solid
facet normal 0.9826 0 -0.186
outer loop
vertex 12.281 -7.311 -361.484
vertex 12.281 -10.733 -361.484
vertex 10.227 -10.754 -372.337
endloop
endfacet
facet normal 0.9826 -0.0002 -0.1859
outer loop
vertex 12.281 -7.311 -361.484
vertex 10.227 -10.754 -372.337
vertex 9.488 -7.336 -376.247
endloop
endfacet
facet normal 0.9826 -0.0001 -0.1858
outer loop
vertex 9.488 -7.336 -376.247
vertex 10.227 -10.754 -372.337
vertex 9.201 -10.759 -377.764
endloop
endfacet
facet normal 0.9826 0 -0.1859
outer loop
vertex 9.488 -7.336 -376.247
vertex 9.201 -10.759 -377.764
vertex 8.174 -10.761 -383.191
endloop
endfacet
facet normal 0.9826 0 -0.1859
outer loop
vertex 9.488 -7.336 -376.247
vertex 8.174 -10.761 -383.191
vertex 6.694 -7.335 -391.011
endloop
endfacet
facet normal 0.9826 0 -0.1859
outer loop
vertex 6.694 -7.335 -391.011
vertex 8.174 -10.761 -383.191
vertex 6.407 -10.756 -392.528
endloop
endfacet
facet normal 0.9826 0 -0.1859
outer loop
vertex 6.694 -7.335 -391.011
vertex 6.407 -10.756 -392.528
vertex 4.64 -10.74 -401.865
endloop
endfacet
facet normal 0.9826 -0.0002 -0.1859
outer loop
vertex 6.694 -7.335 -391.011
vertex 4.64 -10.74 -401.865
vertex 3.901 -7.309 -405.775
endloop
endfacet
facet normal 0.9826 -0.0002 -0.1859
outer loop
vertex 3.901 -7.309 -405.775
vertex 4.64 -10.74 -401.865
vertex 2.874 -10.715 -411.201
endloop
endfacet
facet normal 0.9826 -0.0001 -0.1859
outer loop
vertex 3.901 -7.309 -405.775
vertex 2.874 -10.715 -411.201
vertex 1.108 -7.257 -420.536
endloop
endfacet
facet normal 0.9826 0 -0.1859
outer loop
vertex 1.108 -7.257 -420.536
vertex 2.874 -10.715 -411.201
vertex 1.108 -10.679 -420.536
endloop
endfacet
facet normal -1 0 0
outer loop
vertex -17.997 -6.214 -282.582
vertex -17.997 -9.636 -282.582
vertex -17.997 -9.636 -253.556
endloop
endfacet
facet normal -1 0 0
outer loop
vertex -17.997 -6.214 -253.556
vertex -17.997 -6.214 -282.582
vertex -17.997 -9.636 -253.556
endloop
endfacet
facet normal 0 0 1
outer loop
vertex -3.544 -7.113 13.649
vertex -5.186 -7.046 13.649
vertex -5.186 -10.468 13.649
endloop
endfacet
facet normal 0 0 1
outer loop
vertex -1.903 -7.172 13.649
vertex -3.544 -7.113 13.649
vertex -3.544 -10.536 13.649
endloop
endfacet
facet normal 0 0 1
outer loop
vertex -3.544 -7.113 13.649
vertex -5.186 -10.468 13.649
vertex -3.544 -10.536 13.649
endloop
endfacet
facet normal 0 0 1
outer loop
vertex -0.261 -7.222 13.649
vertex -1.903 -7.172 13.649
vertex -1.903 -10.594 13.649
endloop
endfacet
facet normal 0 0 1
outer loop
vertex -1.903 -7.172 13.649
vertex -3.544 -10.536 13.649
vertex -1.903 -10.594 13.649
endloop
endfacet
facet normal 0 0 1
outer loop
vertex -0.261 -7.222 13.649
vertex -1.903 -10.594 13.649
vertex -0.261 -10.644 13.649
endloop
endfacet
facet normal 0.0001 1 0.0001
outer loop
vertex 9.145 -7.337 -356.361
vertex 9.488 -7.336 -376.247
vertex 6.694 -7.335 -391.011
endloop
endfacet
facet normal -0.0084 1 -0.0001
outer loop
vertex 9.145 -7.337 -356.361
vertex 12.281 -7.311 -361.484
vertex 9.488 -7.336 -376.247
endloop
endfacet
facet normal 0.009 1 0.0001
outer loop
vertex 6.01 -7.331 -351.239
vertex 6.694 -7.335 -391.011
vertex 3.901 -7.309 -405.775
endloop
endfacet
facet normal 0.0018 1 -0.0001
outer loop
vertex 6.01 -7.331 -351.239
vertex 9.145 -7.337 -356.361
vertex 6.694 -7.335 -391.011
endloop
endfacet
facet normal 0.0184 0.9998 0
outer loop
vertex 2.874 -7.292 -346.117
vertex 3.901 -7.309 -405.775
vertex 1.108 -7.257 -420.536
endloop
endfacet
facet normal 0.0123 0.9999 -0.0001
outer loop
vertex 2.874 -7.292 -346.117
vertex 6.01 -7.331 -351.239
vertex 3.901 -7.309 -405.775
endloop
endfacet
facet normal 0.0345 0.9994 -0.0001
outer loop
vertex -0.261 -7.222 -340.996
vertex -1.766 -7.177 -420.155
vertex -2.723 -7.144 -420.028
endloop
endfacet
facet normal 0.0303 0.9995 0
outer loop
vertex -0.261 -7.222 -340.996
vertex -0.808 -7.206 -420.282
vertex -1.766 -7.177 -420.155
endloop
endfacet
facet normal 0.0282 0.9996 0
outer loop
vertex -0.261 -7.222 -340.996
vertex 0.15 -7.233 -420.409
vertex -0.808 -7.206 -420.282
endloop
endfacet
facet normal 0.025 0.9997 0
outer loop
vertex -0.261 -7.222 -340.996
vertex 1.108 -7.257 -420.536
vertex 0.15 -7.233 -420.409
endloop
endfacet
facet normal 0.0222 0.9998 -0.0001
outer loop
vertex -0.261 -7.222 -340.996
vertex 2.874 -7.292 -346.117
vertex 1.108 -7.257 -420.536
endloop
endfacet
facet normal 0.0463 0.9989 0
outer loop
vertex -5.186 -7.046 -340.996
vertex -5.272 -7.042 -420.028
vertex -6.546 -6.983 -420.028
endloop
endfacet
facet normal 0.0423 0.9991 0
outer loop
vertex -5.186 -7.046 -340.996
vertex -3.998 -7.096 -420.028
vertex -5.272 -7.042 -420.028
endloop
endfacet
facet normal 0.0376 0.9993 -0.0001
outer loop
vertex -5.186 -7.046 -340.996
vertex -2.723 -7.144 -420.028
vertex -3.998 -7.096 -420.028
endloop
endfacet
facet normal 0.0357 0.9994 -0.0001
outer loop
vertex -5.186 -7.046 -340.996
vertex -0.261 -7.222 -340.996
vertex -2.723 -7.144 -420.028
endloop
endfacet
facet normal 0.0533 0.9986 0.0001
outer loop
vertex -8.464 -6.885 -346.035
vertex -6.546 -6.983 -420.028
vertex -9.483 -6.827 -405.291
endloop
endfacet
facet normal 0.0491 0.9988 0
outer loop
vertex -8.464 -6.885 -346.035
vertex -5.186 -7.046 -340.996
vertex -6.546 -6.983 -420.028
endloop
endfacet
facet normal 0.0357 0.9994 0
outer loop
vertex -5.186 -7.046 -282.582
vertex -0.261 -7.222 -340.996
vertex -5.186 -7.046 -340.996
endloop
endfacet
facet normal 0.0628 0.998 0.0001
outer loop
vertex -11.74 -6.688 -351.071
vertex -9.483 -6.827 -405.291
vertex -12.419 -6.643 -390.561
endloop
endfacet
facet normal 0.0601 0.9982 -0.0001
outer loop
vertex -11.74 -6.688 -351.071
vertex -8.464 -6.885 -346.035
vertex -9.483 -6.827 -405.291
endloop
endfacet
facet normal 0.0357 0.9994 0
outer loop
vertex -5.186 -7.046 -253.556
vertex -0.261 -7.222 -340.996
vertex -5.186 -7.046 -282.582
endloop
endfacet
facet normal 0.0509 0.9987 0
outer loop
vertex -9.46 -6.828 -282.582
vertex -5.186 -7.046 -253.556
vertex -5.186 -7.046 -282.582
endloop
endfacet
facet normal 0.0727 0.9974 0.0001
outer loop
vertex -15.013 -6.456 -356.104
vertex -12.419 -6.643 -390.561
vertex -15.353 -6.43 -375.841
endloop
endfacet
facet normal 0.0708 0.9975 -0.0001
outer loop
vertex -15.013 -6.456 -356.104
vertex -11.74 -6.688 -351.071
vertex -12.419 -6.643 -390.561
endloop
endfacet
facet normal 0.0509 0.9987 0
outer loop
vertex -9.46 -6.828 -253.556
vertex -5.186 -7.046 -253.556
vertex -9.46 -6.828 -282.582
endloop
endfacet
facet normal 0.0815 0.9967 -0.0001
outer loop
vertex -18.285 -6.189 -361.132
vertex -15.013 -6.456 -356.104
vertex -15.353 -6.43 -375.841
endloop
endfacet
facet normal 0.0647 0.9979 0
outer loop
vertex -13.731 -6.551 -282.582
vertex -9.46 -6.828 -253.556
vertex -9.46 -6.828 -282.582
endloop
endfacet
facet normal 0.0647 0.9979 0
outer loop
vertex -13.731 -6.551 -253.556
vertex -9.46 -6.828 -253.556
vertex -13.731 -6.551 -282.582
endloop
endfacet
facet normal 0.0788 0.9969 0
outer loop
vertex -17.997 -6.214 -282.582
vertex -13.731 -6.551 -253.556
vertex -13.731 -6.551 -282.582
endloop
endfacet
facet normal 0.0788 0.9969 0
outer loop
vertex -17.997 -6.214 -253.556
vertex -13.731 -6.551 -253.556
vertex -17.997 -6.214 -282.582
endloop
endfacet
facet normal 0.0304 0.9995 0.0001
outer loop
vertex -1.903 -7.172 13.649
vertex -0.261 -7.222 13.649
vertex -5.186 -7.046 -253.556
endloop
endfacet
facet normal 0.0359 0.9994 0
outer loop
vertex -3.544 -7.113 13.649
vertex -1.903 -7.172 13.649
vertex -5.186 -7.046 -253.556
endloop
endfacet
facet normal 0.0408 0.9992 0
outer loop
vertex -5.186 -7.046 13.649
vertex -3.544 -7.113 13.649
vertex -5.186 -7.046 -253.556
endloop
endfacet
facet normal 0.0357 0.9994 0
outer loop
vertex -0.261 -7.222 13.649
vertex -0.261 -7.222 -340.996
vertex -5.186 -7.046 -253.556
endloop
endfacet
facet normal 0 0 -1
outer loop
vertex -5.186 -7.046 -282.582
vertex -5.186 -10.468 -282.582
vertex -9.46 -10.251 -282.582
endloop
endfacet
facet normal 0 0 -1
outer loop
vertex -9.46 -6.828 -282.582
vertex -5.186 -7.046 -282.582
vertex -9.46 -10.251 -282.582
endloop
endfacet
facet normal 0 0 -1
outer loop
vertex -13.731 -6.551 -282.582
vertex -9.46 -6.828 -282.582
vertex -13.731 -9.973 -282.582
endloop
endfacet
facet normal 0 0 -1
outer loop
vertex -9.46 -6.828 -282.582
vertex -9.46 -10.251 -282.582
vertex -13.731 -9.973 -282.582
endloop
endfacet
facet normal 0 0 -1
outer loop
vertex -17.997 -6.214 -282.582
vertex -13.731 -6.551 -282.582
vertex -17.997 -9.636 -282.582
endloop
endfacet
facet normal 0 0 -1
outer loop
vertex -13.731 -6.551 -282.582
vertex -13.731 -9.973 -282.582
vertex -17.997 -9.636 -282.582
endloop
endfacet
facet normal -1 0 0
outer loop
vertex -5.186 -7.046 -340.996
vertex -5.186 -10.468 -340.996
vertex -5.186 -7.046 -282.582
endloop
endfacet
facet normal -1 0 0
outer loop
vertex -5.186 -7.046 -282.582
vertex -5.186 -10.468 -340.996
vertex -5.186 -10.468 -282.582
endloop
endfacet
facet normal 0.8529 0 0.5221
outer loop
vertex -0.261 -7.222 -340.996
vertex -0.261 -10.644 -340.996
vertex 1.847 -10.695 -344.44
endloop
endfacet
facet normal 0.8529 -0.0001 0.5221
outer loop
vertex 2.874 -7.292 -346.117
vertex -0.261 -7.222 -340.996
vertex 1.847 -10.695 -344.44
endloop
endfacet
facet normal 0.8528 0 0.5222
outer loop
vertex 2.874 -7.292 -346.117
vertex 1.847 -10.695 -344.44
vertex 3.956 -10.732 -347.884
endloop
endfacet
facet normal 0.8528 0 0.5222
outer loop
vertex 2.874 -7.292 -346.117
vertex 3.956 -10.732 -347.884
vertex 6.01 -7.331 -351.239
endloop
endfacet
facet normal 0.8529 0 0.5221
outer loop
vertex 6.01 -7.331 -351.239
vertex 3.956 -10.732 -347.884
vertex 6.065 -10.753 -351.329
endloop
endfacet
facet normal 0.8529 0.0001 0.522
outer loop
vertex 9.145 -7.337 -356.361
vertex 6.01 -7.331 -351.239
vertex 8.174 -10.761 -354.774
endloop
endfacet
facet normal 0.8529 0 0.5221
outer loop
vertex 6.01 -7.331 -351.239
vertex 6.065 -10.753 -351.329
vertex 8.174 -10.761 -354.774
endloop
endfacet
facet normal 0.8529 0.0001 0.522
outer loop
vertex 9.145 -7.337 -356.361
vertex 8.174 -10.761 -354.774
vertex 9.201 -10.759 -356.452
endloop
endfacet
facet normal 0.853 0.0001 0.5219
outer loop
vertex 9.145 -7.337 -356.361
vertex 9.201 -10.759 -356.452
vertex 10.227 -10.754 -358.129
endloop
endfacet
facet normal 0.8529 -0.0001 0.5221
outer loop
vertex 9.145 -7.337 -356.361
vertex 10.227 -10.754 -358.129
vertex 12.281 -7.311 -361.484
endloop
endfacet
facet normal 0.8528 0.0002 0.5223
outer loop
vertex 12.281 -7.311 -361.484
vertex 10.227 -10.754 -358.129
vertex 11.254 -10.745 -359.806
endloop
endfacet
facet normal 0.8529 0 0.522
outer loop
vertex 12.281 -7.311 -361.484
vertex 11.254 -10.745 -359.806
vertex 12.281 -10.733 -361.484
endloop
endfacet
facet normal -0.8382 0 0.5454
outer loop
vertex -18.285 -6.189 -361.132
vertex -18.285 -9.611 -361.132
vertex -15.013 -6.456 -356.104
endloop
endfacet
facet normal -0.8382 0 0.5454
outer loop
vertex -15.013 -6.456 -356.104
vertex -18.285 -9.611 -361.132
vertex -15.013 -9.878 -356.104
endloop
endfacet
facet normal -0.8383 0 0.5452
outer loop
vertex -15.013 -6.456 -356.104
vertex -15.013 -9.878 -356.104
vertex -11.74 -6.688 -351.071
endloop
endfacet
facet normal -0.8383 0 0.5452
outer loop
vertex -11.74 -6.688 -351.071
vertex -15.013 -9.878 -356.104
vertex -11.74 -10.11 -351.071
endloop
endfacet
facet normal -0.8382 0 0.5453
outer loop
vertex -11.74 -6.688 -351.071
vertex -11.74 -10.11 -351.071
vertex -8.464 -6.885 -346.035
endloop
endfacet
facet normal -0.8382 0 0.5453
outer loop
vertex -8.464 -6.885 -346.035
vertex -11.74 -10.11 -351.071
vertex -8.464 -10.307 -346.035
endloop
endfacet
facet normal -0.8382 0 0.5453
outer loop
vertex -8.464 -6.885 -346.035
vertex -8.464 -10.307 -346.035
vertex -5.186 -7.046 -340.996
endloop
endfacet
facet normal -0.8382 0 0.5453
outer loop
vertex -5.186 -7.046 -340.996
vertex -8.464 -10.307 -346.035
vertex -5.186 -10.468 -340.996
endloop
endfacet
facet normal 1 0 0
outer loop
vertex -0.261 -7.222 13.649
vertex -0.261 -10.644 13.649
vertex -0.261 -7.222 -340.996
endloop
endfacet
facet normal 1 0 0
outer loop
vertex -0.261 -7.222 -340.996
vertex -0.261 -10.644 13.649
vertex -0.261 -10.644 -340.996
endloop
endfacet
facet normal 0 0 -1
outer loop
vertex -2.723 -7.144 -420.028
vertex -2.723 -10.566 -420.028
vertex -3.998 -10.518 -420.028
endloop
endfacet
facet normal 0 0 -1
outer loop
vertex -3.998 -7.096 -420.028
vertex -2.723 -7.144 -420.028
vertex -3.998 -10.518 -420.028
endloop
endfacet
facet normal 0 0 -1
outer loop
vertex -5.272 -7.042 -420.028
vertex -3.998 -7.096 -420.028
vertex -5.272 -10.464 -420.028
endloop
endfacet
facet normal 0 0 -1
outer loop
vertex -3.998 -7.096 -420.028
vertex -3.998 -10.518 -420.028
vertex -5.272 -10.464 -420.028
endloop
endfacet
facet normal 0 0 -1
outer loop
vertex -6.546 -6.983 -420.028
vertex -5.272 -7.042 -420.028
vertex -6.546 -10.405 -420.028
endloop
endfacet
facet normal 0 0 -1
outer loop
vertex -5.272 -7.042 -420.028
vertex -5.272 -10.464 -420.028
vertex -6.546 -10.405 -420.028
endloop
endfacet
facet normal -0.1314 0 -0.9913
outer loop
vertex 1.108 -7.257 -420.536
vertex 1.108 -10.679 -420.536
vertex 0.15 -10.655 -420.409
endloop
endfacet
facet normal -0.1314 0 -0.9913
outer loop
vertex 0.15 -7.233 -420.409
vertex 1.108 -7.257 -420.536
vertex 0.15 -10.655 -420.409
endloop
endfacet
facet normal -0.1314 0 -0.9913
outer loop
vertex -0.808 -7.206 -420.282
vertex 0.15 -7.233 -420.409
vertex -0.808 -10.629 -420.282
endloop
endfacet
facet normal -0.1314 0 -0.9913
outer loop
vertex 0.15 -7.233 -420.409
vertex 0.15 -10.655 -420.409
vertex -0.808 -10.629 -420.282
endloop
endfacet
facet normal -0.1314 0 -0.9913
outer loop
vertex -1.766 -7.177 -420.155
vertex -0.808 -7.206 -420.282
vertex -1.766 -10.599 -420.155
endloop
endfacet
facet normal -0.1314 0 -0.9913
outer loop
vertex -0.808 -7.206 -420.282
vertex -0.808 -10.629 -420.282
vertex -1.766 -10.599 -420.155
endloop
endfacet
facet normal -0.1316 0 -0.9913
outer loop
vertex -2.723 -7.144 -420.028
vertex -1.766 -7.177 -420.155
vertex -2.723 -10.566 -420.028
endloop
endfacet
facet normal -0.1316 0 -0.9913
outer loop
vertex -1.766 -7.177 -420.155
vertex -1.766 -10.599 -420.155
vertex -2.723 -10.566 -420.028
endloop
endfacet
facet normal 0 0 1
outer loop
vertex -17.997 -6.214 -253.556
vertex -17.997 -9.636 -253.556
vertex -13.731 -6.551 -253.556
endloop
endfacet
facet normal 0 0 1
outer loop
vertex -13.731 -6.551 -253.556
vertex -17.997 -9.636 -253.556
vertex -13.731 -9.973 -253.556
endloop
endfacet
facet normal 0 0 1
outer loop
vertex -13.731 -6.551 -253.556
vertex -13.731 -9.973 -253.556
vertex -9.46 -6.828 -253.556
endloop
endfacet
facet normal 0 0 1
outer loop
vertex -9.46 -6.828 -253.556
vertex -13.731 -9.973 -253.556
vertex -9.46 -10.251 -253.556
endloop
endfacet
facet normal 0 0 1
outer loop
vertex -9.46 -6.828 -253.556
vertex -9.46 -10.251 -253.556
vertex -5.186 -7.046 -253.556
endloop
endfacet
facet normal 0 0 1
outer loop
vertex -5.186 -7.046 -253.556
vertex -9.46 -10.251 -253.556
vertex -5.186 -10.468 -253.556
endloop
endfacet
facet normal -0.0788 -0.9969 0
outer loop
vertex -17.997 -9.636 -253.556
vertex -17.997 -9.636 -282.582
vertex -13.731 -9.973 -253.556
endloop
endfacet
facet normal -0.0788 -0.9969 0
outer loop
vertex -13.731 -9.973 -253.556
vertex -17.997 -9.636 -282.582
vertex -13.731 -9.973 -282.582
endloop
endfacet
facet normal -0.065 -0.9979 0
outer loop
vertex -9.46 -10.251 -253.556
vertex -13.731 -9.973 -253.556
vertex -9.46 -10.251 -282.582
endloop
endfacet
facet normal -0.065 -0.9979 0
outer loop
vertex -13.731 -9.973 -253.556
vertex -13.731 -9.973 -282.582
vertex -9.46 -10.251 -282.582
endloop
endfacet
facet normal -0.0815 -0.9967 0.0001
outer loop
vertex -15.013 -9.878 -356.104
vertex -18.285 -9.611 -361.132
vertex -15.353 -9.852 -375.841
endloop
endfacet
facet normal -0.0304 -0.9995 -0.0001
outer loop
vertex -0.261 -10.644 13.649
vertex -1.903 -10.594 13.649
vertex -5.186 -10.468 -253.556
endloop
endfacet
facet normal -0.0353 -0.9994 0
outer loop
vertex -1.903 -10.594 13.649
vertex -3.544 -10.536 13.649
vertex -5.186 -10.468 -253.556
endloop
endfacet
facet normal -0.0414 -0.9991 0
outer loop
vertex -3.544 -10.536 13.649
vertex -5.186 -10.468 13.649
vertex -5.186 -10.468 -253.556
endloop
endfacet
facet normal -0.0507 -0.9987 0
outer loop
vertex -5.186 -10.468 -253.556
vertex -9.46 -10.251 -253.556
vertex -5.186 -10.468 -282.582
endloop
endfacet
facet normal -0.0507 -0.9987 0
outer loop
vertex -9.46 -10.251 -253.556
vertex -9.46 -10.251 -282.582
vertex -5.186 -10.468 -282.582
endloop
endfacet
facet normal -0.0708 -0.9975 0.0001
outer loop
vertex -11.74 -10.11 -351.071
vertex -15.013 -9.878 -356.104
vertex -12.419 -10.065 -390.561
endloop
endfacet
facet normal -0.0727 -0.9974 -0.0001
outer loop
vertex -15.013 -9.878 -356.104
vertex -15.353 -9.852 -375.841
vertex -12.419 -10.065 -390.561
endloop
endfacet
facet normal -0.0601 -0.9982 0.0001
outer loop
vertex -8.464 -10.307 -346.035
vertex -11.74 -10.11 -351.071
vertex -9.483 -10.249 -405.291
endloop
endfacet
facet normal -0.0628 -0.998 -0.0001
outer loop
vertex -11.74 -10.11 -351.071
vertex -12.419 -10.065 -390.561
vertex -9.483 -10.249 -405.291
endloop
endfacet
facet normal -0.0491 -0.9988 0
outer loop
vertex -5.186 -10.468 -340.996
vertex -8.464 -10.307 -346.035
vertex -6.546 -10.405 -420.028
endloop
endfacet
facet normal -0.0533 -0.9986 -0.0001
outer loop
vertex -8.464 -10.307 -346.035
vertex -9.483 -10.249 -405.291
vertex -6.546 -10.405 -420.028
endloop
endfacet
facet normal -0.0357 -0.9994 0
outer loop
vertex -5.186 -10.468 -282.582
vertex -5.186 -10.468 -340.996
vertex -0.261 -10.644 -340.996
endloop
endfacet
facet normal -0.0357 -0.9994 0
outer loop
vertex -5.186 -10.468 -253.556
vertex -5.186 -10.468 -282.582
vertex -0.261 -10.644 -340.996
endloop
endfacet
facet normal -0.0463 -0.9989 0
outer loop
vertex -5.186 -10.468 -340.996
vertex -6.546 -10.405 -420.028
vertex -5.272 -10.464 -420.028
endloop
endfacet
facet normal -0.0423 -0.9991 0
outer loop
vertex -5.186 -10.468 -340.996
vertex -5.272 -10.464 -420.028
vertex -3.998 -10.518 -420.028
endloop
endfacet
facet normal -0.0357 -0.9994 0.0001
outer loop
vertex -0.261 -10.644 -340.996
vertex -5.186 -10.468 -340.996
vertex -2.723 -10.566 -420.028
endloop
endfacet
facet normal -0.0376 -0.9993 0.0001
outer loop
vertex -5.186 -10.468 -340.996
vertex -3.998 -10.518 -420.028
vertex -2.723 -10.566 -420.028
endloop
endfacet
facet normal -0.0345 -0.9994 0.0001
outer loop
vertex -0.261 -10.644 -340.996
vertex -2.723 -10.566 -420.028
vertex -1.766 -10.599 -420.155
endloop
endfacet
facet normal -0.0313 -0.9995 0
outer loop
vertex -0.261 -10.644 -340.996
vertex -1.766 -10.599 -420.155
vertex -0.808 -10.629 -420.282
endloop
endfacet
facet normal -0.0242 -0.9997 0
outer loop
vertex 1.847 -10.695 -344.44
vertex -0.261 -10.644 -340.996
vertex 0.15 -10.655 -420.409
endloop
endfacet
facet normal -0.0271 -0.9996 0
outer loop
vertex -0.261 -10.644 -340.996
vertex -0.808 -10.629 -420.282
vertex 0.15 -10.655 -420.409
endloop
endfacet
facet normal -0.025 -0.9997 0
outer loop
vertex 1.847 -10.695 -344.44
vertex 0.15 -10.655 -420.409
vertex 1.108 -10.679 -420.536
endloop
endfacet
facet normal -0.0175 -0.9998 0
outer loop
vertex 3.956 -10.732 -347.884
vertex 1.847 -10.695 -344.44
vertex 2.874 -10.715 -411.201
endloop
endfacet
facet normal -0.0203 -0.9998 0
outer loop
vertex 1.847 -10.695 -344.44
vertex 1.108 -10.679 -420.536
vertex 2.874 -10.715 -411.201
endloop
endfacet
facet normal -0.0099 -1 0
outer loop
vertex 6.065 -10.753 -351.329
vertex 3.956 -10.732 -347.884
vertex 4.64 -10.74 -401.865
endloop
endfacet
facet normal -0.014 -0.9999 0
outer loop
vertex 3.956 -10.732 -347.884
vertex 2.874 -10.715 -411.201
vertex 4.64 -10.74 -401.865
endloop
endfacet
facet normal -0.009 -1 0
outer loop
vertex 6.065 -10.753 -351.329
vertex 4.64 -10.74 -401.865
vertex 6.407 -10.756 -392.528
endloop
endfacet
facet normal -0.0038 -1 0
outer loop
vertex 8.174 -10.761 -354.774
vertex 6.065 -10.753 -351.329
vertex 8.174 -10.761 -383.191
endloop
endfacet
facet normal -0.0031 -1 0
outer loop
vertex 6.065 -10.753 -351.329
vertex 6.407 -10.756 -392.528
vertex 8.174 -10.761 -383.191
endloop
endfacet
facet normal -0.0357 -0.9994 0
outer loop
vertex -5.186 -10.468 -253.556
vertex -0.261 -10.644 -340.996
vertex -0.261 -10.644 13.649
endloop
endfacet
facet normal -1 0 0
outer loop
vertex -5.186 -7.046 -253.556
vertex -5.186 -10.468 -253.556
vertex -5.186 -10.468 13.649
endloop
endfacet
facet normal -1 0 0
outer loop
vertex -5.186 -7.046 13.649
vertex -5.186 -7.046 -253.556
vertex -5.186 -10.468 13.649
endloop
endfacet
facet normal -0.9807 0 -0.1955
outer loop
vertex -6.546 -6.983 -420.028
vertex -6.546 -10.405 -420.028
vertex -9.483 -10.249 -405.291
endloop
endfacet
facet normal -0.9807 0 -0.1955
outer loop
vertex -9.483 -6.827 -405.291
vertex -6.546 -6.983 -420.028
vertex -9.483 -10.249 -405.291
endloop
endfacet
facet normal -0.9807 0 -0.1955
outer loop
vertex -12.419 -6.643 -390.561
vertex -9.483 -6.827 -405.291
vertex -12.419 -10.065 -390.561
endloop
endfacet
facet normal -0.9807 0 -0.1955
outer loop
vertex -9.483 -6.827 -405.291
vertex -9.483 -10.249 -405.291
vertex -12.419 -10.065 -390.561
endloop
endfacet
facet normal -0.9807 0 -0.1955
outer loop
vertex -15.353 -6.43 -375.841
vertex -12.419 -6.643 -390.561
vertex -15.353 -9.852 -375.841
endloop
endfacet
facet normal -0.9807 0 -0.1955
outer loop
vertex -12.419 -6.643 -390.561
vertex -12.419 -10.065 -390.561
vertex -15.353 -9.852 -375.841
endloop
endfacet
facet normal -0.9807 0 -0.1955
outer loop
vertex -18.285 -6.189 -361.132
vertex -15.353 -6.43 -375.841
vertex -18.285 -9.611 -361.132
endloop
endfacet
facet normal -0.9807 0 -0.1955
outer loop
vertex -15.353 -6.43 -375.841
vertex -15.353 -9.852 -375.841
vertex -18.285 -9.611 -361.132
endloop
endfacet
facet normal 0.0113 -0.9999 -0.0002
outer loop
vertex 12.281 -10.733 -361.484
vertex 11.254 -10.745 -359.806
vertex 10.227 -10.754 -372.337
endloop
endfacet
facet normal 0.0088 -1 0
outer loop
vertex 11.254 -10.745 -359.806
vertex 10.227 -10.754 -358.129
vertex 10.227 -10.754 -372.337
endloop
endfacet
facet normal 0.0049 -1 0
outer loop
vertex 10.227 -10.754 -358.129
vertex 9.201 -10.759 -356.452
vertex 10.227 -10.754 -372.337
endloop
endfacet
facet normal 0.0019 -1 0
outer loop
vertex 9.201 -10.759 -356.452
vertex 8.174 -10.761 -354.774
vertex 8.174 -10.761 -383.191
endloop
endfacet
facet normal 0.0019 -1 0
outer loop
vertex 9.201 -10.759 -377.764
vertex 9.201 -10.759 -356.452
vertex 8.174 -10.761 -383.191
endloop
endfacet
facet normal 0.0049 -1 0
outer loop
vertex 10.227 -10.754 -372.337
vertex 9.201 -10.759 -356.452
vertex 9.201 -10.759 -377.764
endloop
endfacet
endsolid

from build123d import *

# Parameters (mm, degrees)
F2_DEPTH = 467.36
F0_W     = 1740.8808469772
F0_H     = 2259.9012851715
F3_DEPTH = 60.96
F4_SCALE = 4.0036646816


with BuildPart() as f2:
    # F1 (on Top) → F2 (new body, symmetric)
    with BuildSketch(Plane.XY):
        with BuildLine():
            ThreePointArc((43.9515819812, 10.727503337), (23.9174424667, 1.374675553), (2.0415819812, -1.8329499959))
            Line((2.0415819812, -1.8329499959), (2.0415819812, -2.6877246239))
            ThreePointArc((2.0415819812, -2.6877246239), (24.6495492784, 0.7433272272), (45.2215819812, 10.727503337))
            Line((45.2215819812, 10.727503337), (43.9515819812, 10.727503337))
        make_face()
        with BuildLine():
            Line((2.0415819812, -2.6877246239), (2.0415819812, -1.8329499959))
            ThreePointArc((2.0415819812, -1.8329499959), (-19.8342785043, 1.374675553), (-39.8684180188, 10.727503337))
            Line((-39.8684180188, 10.727503337), (-41.1384180188, 10.727503337))
            ThreePointArc((-41.1384180188, 10.727503337), (-20.566385316, 0.7433272272), (2.0415819812, -2.6877246239))
        make_face()
    extrude(amount=F2_DEPTH, both=True)

    # F0 (on Front) → F3 (cut, symmetric)
    with BuildSketch(Plane.XZ):
        with Locations((133.3307623863, -204.713344574)):
            Rectangle(F0_W, F0_H)
        with BuildLine():
            Line((-1.295193345, -63.3309016509), (-1.295193345, 3.4090982191))
            Line((-1.295193345, 3.4090982191), (-0.065193265, 3.4090982191))
            Line((-0.065193265, 3.4090982191), (-0.065193265, -85.1709024209))
            Line((-0.065193265, -85.1709024209), (3.0674625036, -90.2881598735))
            Line((3.0674625036, -90.2881598735), (0.2766351171, -105.037851818))
            add(Edge.make_bspline(
                [(-0.680193305, -107.4909024849), (-0.3650057018, -107.493656038), (-0.0441852923, -106.265753928), (0.2766351171, -105.037851818)],
                knots=[0.5054719927, 0.5054719927, 0.5054719927, 0.5054719927, 1, 1, 1, 1], degree=3))
            add(Edge.make_bspline(
                [(-1.6349118244, -104.9110038356), (-1.3186339428, -106.1995459155), (-1.0023560613, -107.4880879954), (-0.680193305, -107.4909024849)],
                knots=[0, 0, 0, 0, 0.5054719927, 0.5054719927, 0.5054719927, 0.5054719927], degree=3))
            Line((-1.6349118244, -104.9110038356), (-4.5669513225, -90.2003612126))
            Line((-4.5669513225, -90.2003612126), (-1.295193345, -85.1709024209))
            Line((-1.295193345, -85.1709024209), (-1.295193345, -70.5809023909))
            Line((-1.295193345, -70.5809023909), (-4.495186945, -70.5809023909))
            Line((-4.495186945, -70.5809023909), (-4.495186945, -63.3309016509))
            Line((-4.495186945, -63.3309016509), (-1.295193345, -63.3309016509))
        make_face(mode=Mode.SUBTRACT)
        with BuildLine():
            Line((-0.680193305, -107.4909024849), (-0.680193305, -104.9110038356))
            Line((-0.680193305, -104.9110038356), (-1.6349118244, -104.9110038356))
            add(Edge.make_bspline(
                [(-1.6349118244, -104.9110038356), (-1.3186339428, -106.1995459155), (-1.0023560613, -107.4880879954), (-0.680193305, -107.4909024849)],
                knots=[0, 0, 0, 0, 0.5054719927, 0.5054719927, 0.5054719927, 0.5054719927], degree=3))
        make_face()
        with BuildLine():
            Line((0.2766351171, -105.037851818), (-0.680193305, -104.9110038356))
            Line((-0.680193305, -104.9110038356), (-0.680193305, -107.4909024849))
            add(Edge.make_bspline(
                [(-0.680193305, -107.4909024849), (-0.3650057018, -107.493656038), (-0.0441852923, -106.265753928), (0.2766351171, -105.037851818)],
                knots=[0.5054719927, 0.5054719927, 0.5054719927, 0.5054719927, 1, 1, 1, 1], degree=3))
        make_face()
    extrude(amount=F3_DEPTH, both=True, mode=Mode.SUBTRACT)


with BuildPart() as f2_1:
    # F4: moved
    add(f2.part.scale(F4_SCALE))


solid = f2_1.part
